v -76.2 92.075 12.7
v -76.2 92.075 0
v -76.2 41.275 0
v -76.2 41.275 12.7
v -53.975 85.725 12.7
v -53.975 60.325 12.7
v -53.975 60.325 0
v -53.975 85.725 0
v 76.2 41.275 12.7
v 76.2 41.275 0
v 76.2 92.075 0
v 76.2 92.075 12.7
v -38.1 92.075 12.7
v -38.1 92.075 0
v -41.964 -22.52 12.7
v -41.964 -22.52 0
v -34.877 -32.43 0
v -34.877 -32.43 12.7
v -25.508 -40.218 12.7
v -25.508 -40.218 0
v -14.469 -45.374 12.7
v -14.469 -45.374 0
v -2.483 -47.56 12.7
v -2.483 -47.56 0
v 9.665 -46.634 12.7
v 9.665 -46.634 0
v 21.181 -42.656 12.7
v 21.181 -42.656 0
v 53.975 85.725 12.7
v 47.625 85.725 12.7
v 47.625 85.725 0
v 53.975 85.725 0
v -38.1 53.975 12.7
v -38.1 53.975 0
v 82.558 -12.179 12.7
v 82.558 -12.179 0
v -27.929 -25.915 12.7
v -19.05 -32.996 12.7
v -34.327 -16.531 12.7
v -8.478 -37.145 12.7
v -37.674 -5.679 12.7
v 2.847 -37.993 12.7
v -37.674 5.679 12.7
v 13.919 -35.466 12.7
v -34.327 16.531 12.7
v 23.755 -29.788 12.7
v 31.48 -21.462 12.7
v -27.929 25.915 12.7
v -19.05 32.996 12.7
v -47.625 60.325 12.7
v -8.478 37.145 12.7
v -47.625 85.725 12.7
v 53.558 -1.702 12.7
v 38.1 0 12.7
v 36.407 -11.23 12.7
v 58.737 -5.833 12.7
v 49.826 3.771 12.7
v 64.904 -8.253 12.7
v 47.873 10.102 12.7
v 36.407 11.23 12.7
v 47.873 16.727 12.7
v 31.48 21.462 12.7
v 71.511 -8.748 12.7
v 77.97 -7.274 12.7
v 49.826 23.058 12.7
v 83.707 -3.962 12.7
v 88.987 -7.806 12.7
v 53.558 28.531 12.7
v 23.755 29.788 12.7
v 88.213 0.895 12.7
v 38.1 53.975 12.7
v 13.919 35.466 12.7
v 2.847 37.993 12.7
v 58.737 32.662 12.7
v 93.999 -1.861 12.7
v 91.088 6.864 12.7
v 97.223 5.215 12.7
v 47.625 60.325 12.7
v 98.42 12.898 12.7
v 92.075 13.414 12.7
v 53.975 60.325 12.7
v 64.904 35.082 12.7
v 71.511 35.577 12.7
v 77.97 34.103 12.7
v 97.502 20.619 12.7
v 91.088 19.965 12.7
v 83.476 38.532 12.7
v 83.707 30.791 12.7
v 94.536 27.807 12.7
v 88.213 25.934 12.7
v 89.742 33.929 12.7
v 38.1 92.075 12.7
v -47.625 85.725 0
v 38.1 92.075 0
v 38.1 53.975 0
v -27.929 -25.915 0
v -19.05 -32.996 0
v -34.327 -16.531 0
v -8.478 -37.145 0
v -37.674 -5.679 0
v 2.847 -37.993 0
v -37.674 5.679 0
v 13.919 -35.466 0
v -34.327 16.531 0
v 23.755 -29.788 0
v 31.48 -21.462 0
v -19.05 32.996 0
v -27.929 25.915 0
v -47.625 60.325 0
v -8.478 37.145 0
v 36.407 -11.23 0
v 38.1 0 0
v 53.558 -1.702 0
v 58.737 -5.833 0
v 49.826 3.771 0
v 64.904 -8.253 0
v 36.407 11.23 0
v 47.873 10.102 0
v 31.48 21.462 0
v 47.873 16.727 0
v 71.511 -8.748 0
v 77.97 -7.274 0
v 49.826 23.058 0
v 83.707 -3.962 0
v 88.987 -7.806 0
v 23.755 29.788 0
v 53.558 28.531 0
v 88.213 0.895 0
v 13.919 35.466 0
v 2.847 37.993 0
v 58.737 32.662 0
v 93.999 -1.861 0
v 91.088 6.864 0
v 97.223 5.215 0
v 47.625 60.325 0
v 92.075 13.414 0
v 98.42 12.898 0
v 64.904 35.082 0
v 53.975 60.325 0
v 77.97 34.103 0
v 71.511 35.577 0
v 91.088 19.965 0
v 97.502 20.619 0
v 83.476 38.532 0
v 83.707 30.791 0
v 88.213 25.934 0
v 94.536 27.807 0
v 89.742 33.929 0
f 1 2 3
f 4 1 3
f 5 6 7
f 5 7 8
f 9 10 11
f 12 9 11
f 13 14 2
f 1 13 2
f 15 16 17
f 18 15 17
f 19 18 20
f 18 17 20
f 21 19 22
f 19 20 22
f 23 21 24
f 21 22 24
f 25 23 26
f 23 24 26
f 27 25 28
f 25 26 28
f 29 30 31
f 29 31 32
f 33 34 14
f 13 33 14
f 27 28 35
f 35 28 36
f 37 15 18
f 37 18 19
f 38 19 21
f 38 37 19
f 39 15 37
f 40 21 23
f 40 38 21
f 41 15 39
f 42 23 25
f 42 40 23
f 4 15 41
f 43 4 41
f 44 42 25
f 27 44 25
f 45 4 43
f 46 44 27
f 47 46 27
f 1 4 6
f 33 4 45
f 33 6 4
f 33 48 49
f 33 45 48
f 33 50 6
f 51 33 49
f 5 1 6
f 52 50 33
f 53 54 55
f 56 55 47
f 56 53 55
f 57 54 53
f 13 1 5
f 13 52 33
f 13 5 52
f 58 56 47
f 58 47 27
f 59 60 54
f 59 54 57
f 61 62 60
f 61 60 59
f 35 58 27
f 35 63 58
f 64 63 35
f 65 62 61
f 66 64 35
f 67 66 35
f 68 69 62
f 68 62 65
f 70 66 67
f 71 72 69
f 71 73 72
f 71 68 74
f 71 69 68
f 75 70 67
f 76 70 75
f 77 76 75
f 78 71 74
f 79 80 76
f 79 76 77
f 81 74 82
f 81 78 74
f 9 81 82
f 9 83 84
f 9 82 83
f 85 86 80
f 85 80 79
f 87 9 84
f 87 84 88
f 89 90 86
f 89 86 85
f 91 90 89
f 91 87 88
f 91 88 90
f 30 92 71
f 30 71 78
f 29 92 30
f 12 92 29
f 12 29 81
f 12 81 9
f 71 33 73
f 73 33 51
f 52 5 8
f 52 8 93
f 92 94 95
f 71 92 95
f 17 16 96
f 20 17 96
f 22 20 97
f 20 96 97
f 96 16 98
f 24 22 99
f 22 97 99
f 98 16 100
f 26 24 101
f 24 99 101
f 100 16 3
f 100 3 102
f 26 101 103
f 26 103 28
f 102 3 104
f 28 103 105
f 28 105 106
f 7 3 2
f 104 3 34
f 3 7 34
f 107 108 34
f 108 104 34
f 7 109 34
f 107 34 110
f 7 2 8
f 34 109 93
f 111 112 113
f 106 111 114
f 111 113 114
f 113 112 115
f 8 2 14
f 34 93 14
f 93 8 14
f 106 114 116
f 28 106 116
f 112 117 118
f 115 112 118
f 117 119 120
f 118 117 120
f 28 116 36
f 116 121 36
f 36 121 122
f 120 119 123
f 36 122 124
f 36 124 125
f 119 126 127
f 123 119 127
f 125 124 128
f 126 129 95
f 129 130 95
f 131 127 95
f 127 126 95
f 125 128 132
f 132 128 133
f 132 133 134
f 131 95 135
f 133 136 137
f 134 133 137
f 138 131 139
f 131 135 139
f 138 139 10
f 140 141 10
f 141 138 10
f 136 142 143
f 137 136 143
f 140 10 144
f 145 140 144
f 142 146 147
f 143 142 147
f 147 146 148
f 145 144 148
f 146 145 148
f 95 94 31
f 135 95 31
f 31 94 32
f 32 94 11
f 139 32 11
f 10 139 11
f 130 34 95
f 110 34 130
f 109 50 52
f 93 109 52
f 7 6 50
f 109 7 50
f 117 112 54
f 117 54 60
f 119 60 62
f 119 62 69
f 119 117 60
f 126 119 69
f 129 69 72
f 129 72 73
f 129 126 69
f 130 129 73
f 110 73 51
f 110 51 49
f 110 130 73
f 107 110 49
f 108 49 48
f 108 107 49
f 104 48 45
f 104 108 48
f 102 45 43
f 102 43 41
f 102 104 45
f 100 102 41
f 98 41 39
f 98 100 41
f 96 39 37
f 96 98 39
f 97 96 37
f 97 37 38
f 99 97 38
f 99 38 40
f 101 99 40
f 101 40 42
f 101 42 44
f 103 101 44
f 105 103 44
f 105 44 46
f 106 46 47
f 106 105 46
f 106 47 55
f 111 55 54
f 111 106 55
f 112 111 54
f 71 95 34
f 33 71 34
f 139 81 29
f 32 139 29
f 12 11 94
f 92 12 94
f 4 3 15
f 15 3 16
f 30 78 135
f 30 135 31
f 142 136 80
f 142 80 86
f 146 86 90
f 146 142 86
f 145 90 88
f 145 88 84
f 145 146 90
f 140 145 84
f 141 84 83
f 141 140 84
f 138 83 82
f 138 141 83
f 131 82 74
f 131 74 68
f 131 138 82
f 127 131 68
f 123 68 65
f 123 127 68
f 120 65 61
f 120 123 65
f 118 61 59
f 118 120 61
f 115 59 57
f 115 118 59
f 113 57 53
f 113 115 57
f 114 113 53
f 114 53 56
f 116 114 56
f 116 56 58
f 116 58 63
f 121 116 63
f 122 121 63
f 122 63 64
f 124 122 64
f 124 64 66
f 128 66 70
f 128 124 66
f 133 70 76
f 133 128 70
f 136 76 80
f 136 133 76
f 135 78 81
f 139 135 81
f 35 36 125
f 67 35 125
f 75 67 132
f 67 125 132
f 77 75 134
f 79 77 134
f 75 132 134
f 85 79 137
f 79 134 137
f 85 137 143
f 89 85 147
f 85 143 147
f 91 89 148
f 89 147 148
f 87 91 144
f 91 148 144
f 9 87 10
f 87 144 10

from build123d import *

# Parameters (mm, degrees)
F0_R     = 38.1
F0_R_2   = 22.225
F1_DEPTH = 12.7
F4_W     = 6.35
F4_H     = 25.4
F5_DEPTH = 12.7
F6_W     = 6.35
F6_H     = 25.4
F7_DEPTH = 12.7


with BuildPart() as f1:
    # F0 (on Top) → F1 (new body)
    with BuildSketch(Plane.XY):
        with BuildLine():
            Line((-76.2, 41.275), (-41.964057, -22.520182))
            ThreePointArc((-41.964057, -22.520182), (-14.468928, -45.373899), (21.180573, -42.655878))
            Line((21.180573, -42.655878), (82.558344, -12.179039))
            ThreePointArc((82.558344, -12.179039), (98.224966, 16.789683), (76.2, 41.275))
            Line((76.2, 41.275), (76.2, 92.075))
            Line((76.2, 92.075), (38.1, 92.075))
            Line((38.1, 92.075), (38.1, 53.975))
            Line((38.1, 53.975), (-38.1, 53.975))
            Line((-38.1, 53.975), (-38.1, 92.075))
            Line((-38.1, 92.075), (-76.2, 92.075))
            Line((-76.2, 92.075), (-76.2, 41.275))
        make_face()
        Circle(F0_R, mode=Mode.SUBTRACT)
        with Locations((69.85, 13.414488)):
            Circle(F0_R_2, mode=Mode.SUBTRACT)
    extrude(amount=F1_DEPTH)

    # F4 (on face) → F5 (cut, through all)
    with BuildSketch(Plane.XY.offset(12.7)):
        with Locations((-50.8, 73.025)):
            Rectangle(F4_W, F4_H)
    extrude(amount=-F5_DEPTH, mode=Mode.SUBTRACT)

    # F6 (on face) → F7 (cut, through all)
    with BuildSketch(Plane.XY.offset(12.7)):
        with Locations((50.8, 73.025)):
            Rectangle(F6_W, F6_H)
    extrude(amount=-F7_DEPTH, mode=Mode.SUBTRACT)


solid = f1.part
